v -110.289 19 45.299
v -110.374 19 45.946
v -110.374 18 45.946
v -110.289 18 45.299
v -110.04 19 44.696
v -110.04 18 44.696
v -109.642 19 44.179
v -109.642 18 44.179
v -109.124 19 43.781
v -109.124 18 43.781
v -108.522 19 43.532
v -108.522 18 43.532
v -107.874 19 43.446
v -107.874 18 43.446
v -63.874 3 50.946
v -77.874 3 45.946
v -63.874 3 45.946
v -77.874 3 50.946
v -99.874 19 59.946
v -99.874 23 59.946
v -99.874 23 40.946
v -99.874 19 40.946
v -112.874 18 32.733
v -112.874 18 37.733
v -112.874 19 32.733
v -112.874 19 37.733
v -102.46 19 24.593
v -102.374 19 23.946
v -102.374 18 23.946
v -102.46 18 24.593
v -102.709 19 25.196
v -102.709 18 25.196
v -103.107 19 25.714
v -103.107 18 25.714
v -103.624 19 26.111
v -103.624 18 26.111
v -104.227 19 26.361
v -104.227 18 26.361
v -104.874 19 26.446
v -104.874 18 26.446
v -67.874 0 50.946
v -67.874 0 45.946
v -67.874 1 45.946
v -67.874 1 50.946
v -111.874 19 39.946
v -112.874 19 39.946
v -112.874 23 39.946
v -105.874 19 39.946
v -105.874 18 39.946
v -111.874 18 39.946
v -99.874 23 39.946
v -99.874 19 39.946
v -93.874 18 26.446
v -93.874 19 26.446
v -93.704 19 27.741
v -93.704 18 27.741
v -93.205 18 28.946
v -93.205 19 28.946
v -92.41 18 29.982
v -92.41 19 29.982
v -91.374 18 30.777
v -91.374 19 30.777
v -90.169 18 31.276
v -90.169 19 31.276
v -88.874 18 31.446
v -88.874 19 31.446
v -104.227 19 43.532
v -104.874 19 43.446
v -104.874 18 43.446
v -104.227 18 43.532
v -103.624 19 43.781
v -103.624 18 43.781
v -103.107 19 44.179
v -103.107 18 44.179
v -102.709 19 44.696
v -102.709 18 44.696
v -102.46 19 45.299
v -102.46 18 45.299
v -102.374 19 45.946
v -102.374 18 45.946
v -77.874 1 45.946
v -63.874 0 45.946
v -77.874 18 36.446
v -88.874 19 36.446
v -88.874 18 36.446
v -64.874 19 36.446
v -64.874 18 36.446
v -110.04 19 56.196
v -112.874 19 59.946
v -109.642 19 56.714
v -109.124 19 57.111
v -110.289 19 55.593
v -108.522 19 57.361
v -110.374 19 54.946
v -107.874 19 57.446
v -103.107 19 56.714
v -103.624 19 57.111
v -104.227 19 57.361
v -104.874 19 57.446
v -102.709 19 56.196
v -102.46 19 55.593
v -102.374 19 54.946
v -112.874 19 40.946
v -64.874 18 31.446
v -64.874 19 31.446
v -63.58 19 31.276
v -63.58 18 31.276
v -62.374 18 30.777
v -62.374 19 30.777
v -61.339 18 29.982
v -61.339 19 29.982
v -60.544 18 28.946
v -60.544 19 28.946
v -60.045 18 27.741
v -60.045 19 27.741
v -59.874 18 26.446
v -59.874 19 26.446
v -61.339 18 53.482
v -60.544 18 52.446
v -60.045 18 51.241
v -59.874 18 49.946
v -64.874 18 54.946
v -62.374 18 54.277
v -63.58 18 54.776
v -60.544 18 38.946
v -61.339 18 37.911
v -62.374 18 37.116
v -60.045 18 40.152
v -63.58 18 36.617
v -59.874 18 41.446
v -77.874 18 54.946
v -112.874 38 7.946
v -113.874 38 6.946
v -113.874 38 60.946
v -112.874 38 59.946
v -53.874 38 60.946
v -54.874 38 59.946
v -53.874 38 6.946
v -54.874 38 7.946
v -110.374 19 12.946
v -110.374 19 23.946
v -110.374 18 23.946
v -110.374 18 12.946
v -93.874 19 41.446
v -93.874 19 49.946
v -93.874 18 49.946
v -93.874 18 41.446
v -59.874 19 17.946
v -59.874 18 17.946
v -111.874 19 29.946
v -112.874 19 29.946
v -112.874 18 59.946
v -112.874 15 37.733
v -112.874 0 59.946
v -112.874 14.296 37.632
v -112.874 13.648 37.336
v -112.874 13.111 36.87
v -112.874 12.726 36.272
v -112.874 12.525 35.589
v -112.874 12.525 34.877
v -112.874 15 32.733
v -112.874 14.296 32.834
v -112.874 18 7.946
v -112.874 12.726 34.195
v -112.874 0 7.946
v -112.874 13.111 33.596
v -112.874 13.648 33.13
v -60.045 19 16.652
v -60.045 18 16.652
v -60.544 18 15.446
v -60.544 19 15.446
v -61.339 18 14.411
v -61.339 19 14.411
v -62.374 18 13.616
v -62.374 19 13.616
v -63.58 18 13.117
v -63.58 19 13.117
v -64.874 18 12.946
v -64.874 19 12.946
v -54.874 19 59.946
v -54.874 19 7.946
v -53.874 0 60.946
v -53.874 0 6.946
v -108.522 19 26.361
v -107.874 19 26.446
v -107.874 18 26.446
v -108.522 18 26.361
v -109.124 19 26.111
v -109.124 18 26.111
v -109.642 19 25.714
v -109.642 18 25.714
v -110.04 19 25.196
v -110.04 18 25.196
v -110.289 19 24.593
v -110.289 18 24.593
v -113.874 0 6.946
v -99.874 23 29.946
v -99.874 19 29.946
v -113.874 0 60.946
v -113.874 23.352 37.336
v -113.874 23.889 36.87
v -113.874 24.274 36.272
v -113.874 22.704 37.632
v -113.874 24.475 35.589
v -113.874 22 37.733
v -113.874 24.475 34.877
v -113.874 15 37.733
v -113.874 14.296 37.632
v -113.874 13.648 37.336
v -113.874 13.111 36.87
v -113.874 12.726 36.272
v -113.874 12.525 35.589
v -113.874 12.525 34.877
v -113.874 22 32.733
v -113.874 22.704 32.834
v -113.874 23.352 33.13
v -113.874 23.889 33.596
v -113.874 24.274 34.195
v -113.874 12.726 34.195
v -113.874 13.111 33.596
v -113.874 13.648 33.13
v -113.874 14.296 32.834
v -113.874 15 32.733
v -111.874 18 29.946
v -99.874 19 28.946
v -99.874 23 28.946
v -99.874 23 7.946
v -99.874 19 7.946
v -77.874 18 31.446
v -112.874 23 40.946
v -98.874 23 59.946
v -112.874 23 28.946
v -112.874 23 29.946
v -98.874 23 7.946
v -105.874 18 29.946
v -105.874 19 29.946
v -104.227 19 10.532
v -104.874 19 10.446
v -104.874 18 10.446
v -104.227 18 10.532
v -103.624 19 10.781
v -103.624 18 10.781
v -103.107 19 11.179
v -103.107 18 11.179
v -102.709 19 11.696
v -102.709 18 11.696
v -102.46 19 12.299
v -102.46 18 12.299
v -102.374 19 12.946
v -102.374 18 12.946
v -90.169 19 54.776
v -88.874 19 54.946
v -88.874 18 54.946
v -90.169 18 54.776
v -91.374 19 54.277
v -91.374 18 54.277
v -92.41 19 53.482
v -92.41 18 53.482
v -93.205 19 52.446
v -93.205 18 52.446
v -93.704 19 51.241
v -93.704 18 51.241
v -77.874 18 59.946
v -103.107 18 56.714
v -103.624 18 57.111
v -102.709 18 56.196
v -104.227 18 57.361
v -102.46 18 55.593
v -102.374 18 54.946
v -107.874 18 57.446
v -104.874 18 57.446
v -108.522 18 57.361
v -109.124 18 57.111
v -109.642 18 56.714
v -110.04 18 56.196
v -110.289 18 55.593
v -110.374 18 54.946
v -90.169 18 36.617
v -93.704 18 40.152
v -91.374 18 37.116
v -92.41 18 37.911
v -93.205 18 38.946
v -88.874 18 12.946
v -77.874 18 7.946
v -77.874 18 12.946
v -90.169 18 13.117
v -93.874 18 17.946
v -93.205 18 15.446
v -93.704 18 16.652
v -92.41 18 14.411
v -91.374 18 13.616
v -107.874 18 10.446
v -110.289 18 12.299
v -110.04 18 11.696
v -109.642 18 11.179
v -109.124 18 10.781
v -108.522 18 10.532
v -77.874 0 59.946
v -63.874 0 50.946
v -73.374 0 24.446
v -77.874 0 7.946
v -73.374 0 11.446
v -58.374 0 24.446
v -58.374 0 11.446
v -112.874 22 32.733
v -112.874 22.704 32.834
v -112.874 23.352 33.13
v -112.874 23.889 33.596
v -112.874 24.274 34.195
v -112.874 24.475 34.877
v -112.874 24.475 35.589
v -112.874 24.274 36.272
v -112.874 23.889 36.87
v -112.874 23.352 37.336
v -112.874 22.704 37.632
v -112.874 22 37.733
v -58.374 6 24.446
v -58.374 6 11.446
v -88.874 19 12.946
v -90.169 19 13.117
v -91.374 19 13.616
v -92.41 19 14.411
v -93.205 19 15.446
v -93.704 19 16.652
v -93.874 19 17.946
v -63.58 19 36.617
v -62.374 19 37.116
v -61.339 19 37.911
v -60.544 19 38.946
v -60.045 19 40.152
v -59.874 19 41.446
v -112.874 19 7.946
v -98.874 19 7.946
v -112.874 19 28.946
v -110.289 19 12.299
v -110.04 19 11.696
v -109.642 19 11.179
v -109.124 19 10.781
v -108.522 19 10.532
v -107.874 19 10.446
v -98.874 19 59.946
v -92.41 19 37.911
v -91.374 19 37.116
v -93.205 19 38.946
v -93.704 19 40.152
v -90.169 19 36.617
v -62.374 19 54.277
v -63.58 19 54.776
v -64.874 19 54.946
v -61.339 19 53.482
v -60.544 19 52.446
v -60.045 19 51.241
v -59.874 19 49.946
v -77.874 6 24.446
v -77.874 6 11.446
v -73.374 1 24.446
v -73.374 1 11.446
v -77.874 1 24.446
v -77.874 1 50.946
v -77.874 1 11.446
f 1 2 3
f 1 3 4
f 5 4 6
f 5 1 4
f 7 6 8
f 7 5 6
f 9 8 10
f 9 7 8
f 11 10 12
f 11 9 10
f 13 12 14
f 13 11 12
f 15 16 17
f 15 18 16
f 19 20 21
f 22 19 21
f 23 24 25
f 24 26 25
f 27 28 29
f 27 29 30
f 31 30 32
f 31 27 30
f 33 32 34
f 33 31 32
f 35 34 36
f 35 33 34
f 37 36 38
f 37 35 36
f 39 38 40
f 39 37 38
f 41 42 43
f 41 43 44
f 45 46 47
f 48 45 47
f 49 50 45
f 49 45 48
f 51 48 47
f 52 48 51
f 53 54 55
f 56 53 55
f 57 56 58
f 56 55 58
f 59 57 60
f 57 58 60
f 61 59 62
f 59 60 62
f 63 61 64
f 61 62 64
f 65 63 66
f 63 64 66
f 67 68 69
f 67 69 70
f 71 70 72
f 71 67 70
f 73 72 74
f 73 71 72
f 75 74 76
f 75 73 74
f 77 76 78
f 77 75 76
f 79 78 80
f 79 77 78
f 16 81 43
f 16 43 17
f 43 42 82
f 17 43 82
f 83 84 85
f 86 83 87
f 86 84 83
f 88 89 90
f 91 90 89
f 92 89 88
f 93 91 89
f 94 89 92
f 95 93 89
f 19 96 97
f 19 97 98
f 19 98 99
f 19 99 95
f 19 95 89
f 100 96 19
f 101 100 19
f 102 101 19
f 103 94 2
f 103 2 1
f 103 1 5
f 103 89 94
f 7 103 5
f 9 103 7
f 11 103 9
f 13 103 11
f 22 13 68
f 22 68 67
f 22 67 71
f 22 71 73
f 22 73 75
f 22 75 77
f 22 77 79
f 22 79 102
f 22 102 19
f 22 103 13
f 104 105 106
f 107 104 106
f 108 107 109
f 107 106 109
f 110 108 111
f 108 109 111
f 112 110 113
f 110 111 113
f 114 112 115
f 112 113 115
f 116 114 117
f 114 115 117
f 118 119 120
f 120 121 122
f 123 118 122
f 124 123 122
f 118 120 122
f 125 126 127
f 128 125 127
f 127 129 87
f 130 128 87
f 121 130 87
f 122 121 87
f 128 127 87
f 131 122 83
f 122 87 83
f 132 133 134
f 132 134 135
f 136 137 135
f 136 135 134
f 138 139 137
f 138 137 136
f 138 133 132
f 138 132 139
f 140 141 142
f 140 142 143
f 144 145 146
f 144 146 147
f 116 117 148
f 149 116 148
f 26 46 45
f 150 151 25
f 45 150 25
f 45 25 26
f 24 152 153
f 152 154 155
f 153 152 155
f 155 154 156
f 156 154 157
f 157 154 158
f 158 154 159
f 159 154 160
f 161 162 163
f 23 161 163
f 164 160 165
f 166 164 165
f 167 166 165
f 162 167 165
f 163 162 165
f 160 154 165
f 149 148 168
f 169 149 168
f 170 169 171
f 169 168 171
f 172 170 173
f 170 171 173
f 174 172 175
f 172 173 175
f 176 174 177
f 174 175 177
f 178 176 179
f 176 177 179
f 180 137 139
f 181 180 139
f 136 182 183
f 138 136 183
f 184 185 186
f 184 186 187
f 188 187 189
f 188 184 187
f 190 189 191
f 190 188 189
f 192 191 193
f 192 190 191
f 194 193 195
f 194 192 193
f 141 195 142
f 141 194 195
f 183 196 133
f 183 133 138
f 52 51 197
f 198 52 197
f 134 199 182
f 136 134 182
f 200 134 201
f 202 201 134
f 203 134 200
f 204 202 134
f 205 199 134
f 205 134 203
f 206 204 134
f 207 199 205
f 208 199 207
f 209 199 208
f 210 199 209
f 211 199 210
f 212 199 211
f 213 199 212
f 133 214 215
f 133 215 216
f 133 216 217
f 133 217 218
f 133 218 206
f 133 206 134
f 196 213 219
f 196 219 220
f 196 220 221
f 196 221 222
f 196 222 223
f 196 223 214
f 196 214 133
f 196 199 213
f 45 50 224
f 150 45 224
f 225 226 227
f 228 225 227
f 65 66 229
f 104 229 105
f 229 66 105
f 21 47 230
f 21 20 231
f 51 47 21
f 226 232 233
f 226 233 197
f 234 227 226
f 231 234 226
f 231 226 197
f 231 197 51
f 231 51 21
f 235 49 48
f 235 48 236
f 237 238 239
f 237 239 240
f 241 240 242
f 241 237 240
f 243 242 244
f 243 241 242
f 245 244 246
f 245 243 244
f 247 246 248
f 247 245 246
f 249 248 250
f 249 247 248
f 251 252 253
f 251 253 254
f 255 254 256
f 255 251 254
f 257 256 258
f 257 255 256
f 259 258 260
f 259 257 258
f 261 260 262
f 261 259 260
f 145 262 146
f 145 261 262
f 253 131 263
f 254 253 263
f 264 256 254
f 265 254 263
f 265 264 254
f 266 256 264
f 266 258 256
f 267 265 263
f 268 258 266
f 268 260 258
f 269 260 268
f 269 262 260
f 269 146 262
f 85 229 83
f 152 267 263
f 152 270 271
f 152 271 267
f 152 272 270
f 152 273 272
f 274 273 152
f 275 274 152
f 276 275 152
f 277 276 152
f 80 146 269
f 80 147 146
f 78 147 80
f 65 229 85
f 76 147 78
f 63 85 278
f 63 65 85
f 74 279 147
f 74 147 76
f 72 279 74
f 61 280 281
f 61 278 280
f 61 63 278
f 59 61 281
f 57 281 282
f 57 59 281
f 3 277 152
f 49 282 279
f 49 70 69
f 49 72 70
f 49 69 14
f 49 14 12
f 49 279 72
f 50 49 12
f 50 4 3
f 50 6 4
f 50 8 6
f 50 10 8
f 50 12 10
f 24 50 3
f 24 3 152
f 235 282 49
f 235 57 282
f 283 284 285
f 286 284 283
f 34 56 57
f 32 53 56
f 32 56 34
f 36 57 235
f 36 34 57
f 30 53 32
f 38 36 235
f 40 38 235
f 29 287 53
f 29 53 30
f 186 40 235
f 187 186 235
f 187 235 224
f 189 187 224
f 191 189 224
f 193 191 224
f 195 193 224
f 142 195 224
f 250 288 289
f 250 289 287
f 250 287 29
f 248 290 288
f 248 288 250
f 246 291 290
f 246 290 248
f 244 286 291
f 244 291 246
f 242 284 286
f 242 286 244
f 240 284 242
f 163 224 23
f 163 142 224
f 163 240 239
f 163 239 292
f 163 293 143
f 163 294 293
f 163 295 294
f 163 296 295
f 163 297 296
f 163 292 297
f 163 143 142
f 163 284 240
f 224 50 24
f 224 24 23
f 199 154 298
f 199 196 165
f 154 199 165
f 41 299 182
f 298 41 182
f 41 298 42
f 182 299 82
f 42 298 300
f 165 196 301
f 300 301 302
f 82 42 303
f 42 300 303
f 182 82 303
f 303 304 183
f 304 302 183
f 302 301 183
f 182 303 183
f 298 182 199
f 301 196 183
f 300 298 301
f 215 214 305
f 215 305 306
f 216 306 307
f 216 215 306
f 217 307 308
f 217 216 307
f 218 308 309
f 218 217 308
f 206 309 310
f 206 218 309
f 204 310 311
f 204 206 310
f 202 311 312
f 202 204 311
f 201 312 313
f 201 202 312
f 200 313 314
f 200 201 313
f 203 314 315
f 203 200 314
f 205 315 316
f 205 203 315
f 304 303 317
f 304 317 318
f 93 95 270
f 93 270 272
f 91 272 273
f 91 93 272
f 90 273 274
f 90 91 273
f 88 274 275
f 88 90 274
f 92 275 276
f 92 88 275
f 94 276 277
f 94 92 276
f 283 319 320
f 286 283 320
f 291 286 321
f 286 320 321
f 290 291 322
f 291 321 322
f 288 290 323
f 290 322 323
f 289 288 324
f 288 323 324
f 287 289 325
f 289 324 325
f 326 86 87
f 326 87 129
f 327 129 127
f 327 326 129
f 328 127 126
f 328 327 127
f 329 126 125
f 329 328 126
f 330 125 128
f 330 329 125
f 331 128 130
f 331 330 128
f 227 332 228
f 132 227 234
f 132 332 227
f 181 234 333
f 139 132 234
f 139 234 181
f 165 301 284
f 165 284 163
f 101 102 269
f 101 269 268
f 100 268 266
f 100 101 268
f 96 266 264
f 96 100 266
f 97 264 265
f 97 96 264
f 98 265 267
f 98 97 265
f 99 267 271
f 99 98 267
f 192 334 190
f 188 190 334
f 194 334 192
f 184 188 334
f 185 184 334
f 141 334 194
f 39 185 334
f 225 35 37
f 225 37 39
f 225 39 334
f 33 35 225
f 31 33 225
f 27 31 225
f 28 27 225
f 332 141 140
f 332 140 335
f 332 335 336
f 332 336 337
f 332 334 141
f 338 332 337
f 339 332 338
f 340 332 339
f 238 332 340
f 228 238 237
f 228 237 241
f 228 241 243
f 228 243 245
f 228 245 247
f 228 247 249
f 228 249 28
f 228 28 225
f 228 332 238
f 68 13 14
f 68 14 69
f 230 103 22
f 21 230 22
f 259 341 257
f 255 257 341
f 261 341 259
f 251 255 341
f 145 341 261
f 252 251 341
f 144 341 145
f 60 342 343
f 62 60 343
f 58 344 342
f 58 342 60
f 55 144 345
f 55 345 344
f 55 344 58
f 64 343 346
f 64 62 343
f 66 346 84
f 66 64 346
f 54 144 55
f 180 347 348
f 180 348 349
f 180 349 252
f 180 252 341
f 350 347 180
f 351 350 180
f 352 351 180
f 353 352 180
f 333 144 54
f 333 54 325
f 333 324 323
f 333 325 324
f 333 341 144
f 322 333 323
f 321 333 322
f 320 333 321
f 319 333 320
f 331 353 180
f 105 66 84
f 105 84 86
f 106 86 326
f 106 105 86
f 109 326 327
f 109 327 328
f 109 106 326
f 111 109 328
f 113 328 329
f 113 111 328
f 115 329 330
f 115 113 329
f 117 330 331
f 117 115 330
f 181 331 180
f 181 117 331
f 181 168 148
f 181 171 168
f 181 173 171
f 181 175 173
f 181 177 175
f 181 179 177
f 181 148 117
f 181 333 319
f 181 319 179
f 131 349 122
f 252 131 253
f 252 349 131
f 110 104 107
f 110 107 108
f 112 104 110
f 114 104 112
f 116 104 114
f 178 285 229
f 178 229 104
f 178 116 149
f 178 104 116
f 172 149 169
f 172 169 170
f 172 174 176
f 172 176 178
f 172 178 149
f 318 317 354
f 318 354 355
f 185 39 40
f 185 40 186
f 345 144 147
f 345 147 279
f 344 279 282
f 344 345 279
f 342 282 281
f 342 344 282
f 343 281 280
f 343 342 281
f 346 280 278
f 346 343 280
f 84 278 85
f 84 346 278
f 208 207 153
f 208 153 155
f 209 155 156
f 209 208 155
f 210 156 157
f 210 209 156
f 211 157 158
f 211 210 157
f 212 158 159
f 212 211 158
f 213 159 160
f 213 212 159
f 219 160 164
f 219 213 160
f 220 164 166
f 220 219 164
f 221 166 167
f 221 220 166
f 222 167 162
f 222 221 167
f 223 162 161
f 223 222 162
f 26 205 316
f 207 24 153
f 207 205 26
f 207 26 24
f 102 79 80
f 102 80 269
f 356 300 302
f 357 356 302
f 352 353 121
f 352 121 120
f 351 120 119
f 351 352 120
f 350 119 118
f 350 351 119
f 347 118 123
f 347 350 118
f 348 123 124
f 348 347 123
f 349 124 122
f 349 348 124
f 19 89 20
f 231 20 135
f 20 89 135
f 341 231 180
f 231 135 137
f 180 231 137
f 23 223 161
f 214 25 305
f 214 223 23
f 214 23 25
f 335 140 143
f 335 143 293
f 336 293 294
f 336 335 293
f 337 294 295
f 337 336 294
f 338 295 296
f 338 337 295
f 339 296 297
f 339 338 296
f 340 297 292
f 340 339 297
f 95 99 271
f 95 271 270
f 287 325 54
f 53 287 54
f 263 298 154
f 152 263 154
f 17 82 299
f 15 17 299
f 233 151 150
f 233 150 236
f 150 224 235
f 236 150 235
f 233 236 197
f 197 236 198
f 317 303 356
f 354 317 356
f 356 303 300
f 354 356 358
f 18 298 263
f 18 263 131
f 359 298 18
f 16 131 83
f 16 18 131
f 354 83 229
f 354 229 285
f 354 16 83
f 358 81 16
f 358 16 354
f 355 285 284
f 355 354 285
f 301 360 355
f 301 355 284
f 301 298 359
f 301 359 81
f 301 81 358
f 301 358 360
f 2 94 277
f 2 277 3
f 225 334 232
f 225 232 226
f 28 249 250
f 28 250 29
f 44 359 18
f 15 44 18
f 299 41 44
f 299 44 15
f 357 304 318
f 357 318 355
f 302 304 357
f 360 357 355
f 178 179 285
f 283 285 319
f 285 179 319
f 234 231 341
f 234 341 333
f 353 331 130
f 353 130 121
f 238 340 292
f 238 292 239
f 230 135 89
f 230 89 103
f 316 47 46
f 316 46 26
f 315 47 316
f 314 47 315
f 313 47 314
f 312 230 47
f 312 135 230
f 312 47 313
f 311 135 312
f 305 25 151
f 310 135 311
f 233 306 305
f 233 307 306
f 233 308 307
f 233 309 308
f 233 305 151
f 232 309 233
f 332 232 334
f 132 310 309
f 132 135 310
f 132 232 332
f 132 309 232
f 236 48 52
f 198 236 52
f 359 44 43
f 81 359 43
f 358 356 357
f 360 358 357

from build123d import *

# Parameters (mm, degrees)
SKETCH1_W           = 60
SKETCH1_H           = 54
BOSS_EXTRUDE1_DEPTH = 38
SKETCH2_W           = 44
SKETCH2_H           = 52
CUT_EXTRUDE1_DEPTH  = 19
SKETCH3_W           = 35
SKETCH3_H           = 52
CUT_EXTRUDE2_DEPTH  = 18
SKETCH4_W           = 6
SKETCH4_H           = 10
CUT_EXTRUDE3_DEPTH  = 38
SKETCH5_W           = 14
SKETCH5_H           = 52
CUT_EXTRUDE5_DEPTH  = 15
SKETCH6_W           = 13
SKETCH6_H           = 52
CUT_EXTRUDE6_DEPTH  = 4
SKETCH8_W           = 15
SKETCH8_H           = 13
CUT_EXTRUDE7_DEPTH  = 6
SKETCH10_W          = 13
SKETCH10_H          = 5
CUT_EXTRUDE8_DEPTH  = 6
SKETCH11_W          = 4
SKETCH11_H          = 5
CUT_EXTRUDE9_DEPTH  = 3
SKETCH12_W          = 5
SKETCH12_H          = 2
CUT_EXTRUDE10_DEPTH = 13
CUT_EXTRUDE11_DEPTH = 1
SKETCH14_W          = 13
SKETCH14_H          = 1
BOSS_EXTRUDE2_DEPTH = 4
SKETCH15_W          = 13
SKETCH15_H          = 1
BOSS_EXTRUDE3_DEPTH = 4
CUT_EXTRUDE12_DEPTH = 1
CUT_EXTRUDE13_DEPTH = 1


with BuildPart() as part:
    # Sketch1 → Boss-Extrude1 (new body)
    with BuildSketch(Plane(origin=(0, 0, 0), x_dir=(1, 0, 0), z_dir=(0, 1, 0))):
        with Locations((-83.874465942, -33.946435202)):
            Rectangle(SKETCH1_W, SKETCH1_H)
    extrude(amount=BOSS_EXTRUDE1_DEPTH)

    # Sketch2 → Cut-Extrude1 (cut)
    with BuildSketch(Plane(origin=(0, 38, 0), x_dir=(1, 0, 0), z_dir=(0, 1, 0))):
        with Locations((-76.874465942, -33.946435202)):
            Rectangle(SKETCH2_W, SKETCH2_H)
    extrude(amount=-CUT_EXTRUDE1_DEPTH, mode=Mode.SUBTRACT)

    # Sketch3 → Cut-Extrude2 (cut)
    with BuildSketch(Plane(origin=(0, 0, 0), x_dir=(-1, 0, 0), z_dir=(0, -1, 0))):
        with Locations((95.374465942, -33.946435202)):
            Rectangle(SKETCH3_W, SKETCH3_H)
    extrude(amount=-CUT_EXTRUDE2_DEPTH, mode=Mode.SUBTRACT)

    # Sketch4 → Cut-Extrude3 (cut)
    with BuildSketch(Plane(origin=(0, 18, 0), x_dir=(-1, 0, 0), z_dir=(0, -1, 0))):
        with Locations((108.874465942, -34.946435202)):
            Rectangle(SKETCH4_W, SKETCH4_H)
    extrude(amount=-CUT_EXTRUDE3_DEPTH, mode=Mode.SUBTRACT)

    # Sketch5 → Cut-Extrude5 (cut)
    with BuildSketch(Plane(origin=(0, 38, 0), x_dir=(1, 0, 0), z_dir=(0, 1, 0))):
        with Locations((-105.874465942, -33.946435202)):
            Rectangle(SKETCH5_W, SKETCH5_H)
    extrude(amount=-CUT_EXTRUDE5_DEPTH, mode=Mode.SUBTRACT)

    # Sketch6 → Cut-Extrude6 (cut)
    with BuildSketch(Plane(origin=(0, 23, 0), x_dir=(1, 0, 0), z_dir=(0, 1, 0))):
        with Locations((-106.374465942, -33.946435202)):
            Rectangle(SKETCH6_W, SKETCH6_H)
    extrude(amount=-CUT_EXTRUDE6_DEPTH, mode=Mode.SUBTRACT)

    # Sketch8 → Cut-Extrude7 (cut)
    with BuildSketch(Plane(origin=(0, 0, 0), x_dir=(-1, 0, 0), z_dir=(0, -1, 0))):
        with Locations((65.874465942, -17.946435202)):
            Rectangle(SKETCH8_W, SKETCH8_H)
    extrude(amount=-CUT_EXTRUDE7_DEPTH, mode=Mode.SUBTRACT)

    # Sketch10 → Cut-Extrude8 (cut)
    with BuildSketch(Plane(origin=(-73.374465942, 0, 0), x_dir=(0, 0, -1), z_dir=(1, 0, 0))):
        with Locations((-17.946435202, 3.5)):
            Rectangle(SKETCH10_W, SKETCH10_H)
    extrude(amount=-CUT_EXTRUDE8_DEPTH, mode=Mode.SUBTRACT)

    # Sketch11 → Cut-Extrude9 (cut)
    with BuildSketch(Plane.XZ):
        with Locations((-65.874465942, 48.446435202)):
            Rectangle(SKETCH11_W, SKETCH11_H)
    extrude(amount=-CUT_EXTRUDE9_DEPTH, mode=Mode.SUBTRACT)

    # Sketch12 → Cut-Extrude10 (cut)
    with BuildSketch(Plane(origin=(-67.874465942, 0, 0), x_dir=(0, 0, -1), z_dir=(1, 0, 0))):
        with Locations((-48.446435202, 2)):
            Rectangle(SKETCH12_W, SKETCH12_H)
    extrude(amount=-CUT_EXTRUDE10_DEPTH, mode=Mode.SUBTRACT)

    # Sketch13 → Cut-Extrude11 (cut)
    with BuildSketch(Plane.ZY.offset(113.874465942)):
        with BuildLine():
            Line((32.733045904, 15), (32.733045904, 22))
            ThreePointArc((32.733045904, 22), (35.233045904, 24.5), (37.733045904, 22))
            Line((37.733045904, 22), (37.733045904, 15))
            ThreePointArc((37.733045904, 15), (35.233045904, 12.5), (32.733045904, 15))
        make_face()
    extrude(amount=-CUT_EXTRUDE11_DEPTH, mode=Mode.SUBTRACT)

    # Sketch14 → Boss-Extrude2 (add)
    with BuildSketch(Plane(origin=(0, 19, 0), x_dir=(1, 0, 0), z_dir=(0, 1, 0))):
        with Locations((-106.374465942, -40.446435202)):
            Rectangle(SKETCH14_W, SKETCH14_H)
    extrude(amount=BOSS_EXTRUDE2_DEPTH)

    # Sketch15 → Boss-Extrude3 (add)
    with BuildSketch(Plane(origin=(0, 19, 0), x_dir=(1, 0, 0), z_dir=(0, 1, 0))):
        with Locations((-106.374465942, -29.446435202)):
            Rectangle(SKETCH15_W, SKETCH15_H)
    extrude(amount=BOSS_EXTRUDE3_DEPTH)

    # Sketch16 → Cut-Extrude12 (cut)
    with BuildSketch(Plane(origin=(0, 19, 0), x_dir=(1, 0, 0), z_dir=(0, 1, 0))):
        with BuildLine():
            Line((-64.874465942, -54.946435202), (-88.874465942, -54.946435202))
            ThreePointArc((-88.874465942, -54.946435202), (-92.409999848, -53.481969108), (-93.874465942, -49.946435202))
            Line((-93.874465942, -49.946435202), (-93.874465942, -41.446435202))
            ThreePointArc((-93.874465942, -41.446435202), (-92.409999848, -37.910901296), (-88.874465942, -36.446435202))
            Line((-88.874465942, -36.446435202), (-64.874465942, -36.446435202))
            ThreePointArc((-64.874465942, -36.446435202), (-61.338932037, -37.910901296), (-59.874465942, -41.446435202))
            Line((-59.874465942, -41.446435202), (-59.874465942, -49.946435202))
            ThreePointArc((-59.874465942, -49.946435202), (-61.338932037, -53.481969108), (-64.874465942, -54.946435202))
        make_face()
        with BuildLine():
            Line((-88.874465942, -31.446435202), (-64.874465942, -31.446435202))
            ThreePointArc((-64.874465942, -31.446435202), (-61.338932037, -29.981969108), (-59.874465942, -26.446435202))
            Line((-59.874465942, -26.446435202), (-59.874465942, -17.946435202))
            ThreePointArc((-59.874465942, -17.946435202), (-61.338932037, -14.410901296), (-64.874465942, -12.946435202))
            Line((-64.874465942, -12.946435202), (-88.874465942, -12.946435202))
            ThreePointArc((-88.874465942, -12.946435202), (-92.409999848, -14.410901296), (-93.874465942, -17.946435202))
            Line((-93.874465942, -17.946435202), (-93.874465942, -26.446435202))
            ThreePointArc((-93.874465942, -26.446435202), (-92.409999848, -29.981969108), (-88.874465942, -31.446435202))
        make_face()
    extrude(amount=-CUT_EXTRUDE12_DEPTH, mode=Mode.SUBTRACT)

    # Sketch17 → Cut-Extrude13 (cut)
    with BuildSketch(Plane(origin=(0, 19, 0), x_dir=(1, 0, 0), z_dir=(0, 1, 0))):
        with BuildLine():
            Line((-104.874465942, -57.446435202), (-107.874465942, -57.446435202))
            ThreePointArc((-107.874465942, -57.446435202), (-109.642232895, -56.714202155), (-110.374465942, -54.946435202))
            Line((-110.374465942, -54.946435202), (-110.374465942, -45.946435202))
            ThreePointArc((-110.374465942, -45.946435202), (-109.642232895, -44.178668249), (-107.874465942, -43.446435202))
            Line((-107.874465942, -43.446435202), (-104.874465942, -43.446435202))
            ThreePointArc((-104.874465942, -43.446435202), (-103.10669899, -44.178668249), (-102.374465942, -45.946435202))
            Line((-102.374465942, -45.946435202), (-102.374465942, -54.946435202))
            ThreePointArc((-102.374465942, -54.946435202), (-103.10669899, -56.714202155), (-104.874465942, -57.446435202))
        make_face()
        with BuildLine():
            Line((-104.874465942, -26.446435202), (-107.874465942, -26.446435202))
            ThreePointArc((-107.874465942, -26.446435202), (-109.642232895, -25.714202155), (-110.374465942, -23.946435202))
            Line((-110.374465942, -23.946435202), (-110.374465942, -12.946435202))
            ThreePointArc((-110.374465942, -12.946435202), (-109.642232895, -11.178668249), (-107.874465942, -10.446435202))
            Line((-107.874465942, -10.446435202), (-104.874465942, -10.446435202))
            ThreePointArc((-104.874465942, -10.446435202), (-103.10669899, -11.178668249), (-102.374465942, -12.946435202))
            Line((-102.374465942, -12.946435202), (-102.374465942, -23.946435202))
            ThreePointArc((-102.374465942, -23.946435202), (-103.10669899, -25.714202155), (-104.874465942, -26.446435202))
        make_face()
    extrude(amount=-CUT_EXTRUDE13_DEPTH, mode=Mode.SUBTRACT)


solid = part.part
